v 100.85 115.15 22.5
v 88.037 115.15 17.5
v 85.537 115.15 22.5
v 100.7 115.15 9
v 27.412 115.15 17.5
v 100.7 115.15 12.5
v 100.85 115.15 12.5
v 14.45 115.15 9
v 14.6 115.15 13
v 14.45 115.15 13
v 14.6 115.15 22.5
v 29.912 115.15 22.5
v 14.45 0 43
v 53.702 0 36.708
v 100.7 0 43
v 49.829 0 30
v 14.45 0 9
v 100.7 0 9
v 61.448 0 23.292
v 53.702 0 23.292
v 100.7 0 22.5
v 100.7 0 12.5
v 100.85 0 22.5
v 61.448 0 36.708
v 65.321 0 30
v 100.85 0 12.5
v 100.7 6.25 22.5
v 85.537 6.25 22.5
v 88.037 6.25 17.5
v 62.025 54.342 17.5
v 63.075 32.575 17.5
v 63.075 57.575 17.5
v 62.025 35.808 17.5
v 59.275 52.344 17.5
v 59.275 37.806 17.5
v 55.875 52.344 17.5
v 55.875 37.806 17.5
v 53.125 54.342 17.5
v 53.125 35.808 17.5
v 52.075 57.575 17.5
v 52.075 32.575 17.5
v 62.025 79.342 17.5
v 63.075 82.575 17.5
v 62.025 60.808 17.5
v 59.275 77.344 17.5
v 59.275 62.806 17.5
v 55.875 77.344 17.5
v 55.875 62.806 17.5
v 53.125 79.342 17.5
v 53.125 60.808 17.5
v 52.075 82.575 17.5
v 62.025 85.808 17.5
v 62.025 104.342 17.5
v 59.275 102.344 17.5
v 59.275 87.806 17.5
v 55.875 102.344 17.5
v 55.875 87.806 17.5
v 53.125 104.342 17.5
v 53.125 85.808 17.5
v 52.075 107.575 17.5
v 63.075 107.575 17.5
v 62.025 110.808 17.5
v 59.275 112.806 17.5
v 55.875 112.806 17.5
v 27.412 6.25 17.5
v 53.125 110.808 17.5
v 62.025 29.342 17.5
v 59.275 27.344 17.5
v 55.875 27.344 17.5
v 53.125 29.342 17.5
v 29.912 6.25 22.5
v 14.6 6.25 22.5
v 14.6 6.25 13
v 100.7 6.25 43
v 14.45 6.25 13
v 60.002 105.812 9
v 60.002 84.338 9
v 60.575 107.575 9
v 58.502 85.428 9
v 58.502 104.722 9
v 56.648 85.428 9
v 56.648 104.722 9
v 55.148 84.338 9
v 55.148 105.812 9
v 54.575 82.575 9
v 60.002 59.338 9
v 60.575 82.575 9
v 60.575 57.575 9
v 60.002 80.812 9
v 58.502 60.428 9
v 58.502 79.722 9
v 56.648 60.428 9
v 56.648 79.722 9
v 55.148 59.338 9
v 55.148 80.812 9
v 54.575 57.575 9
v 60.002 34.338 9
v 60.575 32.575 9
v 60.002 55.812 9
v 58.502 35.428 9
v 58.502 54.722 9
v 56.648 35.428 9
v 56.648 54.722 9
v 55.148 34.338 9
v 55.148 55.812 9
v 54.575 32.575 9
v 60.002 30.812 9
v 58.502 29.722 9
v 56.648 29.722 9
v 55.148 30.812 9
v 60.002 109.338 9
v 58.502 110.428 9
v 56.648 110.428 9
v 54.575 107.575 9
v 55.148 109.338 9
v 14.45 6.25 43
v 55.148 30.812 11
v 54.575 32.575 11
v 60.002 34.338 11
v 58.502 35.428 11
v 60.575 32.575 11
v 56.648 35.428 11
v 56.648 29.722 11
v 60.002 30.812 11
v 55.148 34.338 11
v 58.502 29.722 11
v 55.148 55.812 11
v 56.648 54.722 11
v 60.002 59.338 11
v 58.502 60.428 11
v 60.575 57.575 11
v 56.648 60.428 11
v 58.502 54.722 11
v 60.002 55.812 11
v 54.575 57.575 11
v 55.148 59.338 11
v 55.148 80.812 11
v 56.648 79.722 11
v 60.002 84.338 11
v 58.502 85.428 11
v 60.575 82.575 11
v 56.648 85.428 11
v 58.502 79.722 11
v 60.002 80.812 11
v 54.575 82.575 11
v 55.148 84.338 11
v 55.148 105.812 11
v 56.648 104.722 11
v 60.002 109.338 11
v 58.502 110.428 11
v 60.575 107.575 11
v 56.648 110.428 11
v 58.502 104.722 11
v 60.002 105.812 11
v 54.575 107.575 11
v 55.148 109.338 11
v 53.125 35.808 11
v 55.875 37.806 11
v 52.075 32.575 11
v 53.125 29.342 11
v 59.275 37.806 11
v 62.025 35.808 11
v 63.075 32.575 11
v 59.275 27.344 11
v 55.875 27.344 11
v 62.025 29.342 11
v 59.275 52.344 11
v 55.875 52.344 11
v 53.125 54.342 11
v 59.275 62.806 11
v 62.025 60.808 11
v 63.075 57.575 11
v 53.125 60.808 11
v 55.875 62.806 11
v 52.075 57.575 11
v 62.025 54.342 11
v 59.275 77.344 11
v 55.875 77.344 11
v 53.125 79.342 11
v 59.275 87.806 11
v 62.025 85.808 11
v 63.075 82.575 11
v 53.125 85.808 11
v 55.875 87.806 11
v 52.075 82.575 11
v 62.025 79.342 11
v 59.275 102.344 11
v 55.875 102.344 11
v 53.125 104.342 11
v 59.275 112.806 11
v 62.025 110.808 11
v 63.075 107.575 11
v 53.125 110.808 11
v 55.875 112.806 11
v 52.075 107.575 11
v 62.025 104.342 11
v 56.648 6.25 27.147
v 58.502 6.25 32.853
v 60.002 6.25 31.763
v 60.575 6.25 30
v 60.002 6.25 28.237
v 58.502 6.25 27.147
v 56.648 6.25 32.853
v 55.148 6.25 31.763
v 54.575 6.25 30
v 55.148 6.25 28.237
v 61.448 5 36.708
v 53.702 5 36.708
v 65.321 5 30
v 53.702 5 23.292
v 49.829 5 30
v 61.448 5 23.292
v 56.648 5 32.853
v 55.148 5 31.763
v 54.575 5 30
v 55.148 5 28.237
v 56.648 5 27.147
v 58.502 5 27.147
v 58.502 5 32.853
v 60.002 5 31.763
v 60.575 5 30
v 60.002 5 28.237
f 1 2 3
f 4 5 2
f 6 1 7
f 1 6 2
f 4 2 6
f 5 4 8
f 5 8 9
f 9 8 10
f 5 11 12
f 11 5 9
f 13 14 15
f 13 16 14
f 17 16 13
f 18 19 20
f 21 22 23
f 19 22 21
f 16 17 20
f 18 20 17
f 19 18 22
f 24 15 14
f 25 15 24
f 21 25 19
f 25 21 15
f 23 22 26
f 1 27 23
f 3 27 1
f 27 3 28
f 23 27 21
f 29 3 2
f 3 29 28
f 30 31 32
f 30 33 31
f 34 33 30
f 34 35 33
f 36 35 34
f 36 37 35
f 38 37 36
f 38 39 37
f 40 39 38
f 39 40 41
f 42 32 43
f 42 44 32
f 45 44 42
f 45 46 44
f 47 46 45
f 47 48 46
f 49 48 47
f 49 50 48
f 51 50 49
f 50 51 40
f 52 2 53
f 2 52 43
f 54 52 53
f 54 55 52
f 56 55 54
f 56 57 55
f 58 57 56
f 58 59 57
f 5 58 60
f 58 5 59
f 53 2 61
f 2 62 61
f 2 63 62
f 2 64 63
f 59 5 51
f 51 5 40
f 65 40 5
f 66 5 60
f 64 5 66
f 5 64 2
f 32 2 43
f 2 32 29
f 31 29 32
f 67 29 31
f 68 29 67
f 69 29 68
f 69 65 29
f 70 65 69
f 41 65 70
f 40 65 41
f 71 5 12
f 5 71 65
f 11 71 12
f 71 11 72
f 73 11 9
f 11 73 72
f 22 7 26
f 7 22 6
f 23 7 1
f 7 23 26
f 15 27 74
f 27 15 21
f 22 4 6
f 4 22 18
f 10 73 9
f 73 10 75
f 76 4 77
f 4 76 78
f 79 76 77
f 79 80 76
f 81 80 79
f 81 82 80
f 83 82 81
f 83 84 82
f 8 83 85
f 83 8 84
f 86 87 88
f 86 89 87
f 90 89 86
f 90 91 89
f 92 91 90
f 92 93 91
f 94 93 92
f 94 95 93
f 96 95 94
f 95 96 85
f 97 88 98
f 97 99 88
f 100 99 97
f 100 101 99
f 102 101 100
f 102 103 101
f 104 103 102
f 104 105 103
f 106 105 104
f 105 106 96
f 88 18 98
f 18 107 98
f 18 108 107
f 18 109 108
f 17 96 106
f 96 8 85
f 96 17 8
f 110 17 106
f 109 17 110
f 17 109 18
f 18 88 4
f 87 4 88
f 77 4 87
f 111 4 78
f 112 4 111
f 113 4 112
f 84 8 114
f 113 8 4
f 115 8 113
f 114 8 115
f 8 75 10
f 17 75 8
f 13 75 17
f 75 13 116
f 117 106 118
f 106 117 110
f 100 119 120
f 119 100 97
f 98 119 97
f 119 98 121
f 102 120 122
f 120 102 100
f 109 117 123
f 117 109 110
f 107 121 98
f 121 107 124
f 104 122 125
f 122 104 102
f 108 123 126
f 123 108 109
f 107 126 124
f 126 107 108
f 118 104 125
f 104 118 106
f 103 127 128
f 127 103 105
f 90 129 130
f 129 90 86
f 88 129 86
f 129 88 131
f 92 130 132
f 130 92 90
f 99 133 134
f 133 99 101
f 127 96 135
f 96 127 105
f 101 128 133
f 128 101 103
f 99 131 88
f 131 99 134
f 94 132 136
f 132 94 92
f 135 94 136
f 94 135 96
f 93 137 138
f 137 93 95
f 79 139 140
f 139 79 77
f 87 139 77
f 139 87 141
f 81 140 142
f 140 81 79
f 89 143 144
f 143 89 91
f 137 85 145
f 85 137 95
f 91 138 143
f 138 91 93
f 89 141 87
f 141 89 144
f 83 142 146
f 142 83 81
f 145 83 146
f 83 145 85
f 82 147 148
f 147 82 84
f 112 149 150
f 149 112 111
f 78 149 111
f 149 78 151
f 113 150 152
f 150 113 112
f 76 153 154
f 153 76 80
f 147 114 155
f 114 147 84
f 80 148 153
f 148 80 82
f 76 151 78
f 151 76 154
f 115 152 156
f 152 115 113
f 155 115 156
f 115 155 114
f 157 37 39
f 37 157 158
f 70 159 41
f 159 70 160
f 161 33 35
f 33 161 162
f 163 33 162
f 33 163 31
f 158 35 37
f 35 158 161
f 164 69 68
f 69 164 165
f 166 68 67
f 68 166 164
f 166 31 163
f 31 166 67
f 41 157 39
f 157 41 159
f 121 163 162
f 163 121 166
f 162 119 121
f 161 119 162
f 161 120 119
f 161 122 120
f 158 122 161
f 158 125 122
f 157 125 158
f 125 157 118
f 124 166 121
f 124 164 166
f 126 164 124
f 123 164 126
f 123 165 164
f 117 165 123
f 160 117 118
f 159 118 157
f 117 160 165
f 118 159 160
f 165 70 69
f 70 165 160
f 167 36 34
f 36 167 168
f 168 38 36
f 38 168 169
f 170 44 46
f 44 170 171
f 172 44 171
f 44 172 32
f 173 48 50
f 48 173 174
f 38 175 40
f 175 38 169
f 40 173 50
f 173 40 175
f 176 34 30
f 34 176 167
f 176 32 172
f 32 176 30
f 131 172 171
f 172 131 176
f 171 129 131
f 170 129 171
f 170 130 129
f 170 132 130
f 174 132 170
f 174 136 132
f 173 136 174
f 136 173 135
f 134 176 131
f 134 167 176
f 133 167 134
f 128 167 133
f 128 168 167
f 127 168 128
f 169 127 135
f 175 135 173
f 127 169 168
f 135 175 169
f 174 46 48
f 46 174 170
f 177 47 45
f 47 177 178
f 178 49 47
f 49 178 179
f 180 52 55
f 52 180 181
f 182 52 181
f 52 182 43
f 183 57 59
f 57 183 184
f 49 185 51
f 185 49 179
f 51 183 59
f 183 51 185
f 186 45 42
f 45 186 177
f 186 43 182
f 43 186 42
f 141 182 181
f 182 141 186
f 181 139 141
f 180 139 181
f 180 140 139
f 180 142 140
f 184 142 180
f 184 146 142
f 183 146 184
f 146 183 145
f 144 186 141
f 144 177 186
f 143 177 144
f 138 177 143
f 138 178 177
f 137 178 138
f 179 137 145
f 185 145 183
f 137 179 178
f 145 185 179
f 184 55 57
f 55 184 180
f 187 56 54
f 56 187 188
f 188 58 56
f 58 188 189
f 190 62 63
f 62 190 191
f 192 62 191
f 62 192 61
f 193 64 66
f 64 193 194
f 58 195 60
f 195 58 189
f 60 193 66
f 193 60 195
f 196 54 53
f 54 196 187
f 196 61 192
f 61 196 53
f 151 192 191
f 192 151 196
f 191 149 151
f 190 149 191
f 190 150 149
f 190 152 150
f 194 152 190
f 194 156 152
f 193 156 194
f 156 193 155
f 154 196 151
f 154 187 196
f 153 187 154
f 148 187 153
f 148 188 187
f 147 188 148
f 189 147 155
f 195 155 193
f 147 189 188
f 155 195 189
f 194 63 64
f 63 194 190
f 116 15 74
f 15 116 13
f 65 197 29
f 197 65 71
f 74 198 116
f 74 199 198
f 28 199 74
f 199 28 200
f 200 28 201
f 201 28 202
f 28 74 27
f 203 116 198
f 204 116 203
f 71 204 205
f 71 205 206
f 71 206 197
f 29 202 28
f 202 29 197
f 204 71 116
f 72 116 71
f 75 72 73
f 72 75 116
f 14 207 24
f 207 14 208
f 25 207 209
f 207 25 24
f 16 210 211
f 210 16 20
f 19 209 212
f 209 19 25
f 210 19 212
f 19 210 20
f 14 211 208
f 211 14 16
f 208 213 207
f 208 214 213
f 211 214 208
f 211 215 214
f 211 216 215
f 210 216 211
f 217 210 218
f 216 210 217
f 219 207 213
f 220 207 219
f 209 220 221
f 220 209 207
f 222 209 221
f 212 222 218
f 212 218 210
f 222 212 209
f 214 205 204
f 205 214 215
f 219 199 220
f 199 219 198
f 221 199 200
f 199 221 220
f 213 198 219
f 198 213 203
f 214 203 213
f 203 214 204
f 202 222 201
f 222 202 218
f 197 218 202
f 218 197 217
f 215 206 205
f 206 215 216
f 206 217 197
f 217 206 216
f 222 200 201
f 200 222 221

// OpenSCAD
//-----Rabo de Andorinha Baixo (Eixo Y)-----//

//-----Declaração de Variáveis-----//
r=3;
d=25;
h=9;
nx=5;
ny=5;
geo=1;
res=10;
aux=2*d+15.15;
aux2=40.7-24.2+111.70-16.7-5.15/2;
aux3=11/2;
aux4=(37.55+4)/2 - (16.35+5.1/2-13.2);
cc=25;
ff=37.5;
gg=0.2;
shift=(17.5+2*d)/2;
shift2=(17.5)/2;
h_alt=11/2;
hip=h_alt/(sin(60));
o_ext=d*0.75+2*shift; // Segundo rabo de andorinha
o_ext2=2*shift2+d*0.75; //Primeiro rabo de andorinha
hex_enc=(12.55/2)/(cos(30));

//-----Declaração de Funções-----//
module funcao_2d_array_cilindros(r,d,h,nx,ny,geo,res){
    //-----FUNÇÃO ARRAY 2D DE CILÍNDROS-----//
    /*
    Forneça:
        raio dos cilíndros: r
        distância entre os centros de cada cilíndro: d
        altura dos cilíndros: h
        quantidade de cilíndros em ambas as direções: nx, ny
        resolução dos cilíndros: res
    Selecione a geometria:
         Retangular: 1
         Hexagonal: 2
    
    Quantidade de cilíndros = nx*ny
    geo=1 => Dimensões: [(nx-1)*d+2*r,(ny-1)*d+2*r,h]
    geo=2 => Dimensões: [(nx-1+cos(60))*d+2*r,(ny-1)*d*sin(60)+2*r,h]
    */
    if (d<2*r){
        text("Error!");
        translate([0,-15,0])text("Verify your specified dimensions.");
    }else{
        if(geo==1){
            for(j=[0:1:ny-1]){
                for(i=[0:1:nx-1]){
                    translate([i*d,j*d,0])cylinder(h,r,r,$fn=res);
                }
            }
        }else if(geo==2){
            for(j=[0:1:ny-1]){
                for(i=[0:1:nx-1]){
                    translate([i*d+(j%2)*d*cos(60),j*d*sin(60),0])cylinder(h,r,r,$fn=res);
                }
            }
        }else{
            text("Error!");
            translate([0,-15,0])text("Please, choose a valid geometry number.");
        }
        
    }    
}

//-----Rabo de Andorinha Eixo Y-----//
//-----Translação no Eixo X (d mm)-----//
translate([d,0,0]){
            
    //-----Rabo de Andorinha Baixo (Eixo Y)-----//
    difference(){
        translate([0,0,0]){
            translate([7.725,4*d+5.15+10,-17.5])rotate([90,0,0])linear_extrude(4*d+5.15+10)polygon(points=[[15-shift+(20-(d*0.75))/2,30],[35+shift-(20-(d*0.75))/2,30],[        35+shift-(20-(d*0.75))/2,40],[27.5+shift*0.75,40],[30+shift*0.75,35],[20-shift*0.75,35],[22.5-shift*0.75,40],[15-shift+(20-(d*0.75))/2,40]]);
            translate([aux/2-shift-(d*0.75)/2,0,0])translate([0,0,9])cube([d*0.75+2*shift,4*d+5.15+10,4]);
        }
        #translate([d+5+5.15/2,5+5.15/2+d,0])funcao_2d_array_cilindros(r,d,h+20,1,4,geo,res);
        #translate([d+5+5.15/2,5+5.15/2+d,18-7])funcao_2d_array_cilindros(11/2,d,h+20,1,4,geo,res);
    };
    
    //-----Fuso/Rosca do Rabo de Andorinha (Eixo Y)-----//
    difference(){
        translate([aux/2-shift-(d*0.75)/2,0,9])cube([d*0.75+2*shift,d*0.25,38-4]);
        #translate([(2*d+5.15+10)/2,5,30])rotate([90,0,0])cylinder(5,hex_enc+0.5,hex_enc+0.5,$fn=6);
        #translate([(2*d+5.15+10)/2,d*0.75,30])rotate([90,0,0])cylinder(d*0.75,r,r,$fn=res);
    }
};
